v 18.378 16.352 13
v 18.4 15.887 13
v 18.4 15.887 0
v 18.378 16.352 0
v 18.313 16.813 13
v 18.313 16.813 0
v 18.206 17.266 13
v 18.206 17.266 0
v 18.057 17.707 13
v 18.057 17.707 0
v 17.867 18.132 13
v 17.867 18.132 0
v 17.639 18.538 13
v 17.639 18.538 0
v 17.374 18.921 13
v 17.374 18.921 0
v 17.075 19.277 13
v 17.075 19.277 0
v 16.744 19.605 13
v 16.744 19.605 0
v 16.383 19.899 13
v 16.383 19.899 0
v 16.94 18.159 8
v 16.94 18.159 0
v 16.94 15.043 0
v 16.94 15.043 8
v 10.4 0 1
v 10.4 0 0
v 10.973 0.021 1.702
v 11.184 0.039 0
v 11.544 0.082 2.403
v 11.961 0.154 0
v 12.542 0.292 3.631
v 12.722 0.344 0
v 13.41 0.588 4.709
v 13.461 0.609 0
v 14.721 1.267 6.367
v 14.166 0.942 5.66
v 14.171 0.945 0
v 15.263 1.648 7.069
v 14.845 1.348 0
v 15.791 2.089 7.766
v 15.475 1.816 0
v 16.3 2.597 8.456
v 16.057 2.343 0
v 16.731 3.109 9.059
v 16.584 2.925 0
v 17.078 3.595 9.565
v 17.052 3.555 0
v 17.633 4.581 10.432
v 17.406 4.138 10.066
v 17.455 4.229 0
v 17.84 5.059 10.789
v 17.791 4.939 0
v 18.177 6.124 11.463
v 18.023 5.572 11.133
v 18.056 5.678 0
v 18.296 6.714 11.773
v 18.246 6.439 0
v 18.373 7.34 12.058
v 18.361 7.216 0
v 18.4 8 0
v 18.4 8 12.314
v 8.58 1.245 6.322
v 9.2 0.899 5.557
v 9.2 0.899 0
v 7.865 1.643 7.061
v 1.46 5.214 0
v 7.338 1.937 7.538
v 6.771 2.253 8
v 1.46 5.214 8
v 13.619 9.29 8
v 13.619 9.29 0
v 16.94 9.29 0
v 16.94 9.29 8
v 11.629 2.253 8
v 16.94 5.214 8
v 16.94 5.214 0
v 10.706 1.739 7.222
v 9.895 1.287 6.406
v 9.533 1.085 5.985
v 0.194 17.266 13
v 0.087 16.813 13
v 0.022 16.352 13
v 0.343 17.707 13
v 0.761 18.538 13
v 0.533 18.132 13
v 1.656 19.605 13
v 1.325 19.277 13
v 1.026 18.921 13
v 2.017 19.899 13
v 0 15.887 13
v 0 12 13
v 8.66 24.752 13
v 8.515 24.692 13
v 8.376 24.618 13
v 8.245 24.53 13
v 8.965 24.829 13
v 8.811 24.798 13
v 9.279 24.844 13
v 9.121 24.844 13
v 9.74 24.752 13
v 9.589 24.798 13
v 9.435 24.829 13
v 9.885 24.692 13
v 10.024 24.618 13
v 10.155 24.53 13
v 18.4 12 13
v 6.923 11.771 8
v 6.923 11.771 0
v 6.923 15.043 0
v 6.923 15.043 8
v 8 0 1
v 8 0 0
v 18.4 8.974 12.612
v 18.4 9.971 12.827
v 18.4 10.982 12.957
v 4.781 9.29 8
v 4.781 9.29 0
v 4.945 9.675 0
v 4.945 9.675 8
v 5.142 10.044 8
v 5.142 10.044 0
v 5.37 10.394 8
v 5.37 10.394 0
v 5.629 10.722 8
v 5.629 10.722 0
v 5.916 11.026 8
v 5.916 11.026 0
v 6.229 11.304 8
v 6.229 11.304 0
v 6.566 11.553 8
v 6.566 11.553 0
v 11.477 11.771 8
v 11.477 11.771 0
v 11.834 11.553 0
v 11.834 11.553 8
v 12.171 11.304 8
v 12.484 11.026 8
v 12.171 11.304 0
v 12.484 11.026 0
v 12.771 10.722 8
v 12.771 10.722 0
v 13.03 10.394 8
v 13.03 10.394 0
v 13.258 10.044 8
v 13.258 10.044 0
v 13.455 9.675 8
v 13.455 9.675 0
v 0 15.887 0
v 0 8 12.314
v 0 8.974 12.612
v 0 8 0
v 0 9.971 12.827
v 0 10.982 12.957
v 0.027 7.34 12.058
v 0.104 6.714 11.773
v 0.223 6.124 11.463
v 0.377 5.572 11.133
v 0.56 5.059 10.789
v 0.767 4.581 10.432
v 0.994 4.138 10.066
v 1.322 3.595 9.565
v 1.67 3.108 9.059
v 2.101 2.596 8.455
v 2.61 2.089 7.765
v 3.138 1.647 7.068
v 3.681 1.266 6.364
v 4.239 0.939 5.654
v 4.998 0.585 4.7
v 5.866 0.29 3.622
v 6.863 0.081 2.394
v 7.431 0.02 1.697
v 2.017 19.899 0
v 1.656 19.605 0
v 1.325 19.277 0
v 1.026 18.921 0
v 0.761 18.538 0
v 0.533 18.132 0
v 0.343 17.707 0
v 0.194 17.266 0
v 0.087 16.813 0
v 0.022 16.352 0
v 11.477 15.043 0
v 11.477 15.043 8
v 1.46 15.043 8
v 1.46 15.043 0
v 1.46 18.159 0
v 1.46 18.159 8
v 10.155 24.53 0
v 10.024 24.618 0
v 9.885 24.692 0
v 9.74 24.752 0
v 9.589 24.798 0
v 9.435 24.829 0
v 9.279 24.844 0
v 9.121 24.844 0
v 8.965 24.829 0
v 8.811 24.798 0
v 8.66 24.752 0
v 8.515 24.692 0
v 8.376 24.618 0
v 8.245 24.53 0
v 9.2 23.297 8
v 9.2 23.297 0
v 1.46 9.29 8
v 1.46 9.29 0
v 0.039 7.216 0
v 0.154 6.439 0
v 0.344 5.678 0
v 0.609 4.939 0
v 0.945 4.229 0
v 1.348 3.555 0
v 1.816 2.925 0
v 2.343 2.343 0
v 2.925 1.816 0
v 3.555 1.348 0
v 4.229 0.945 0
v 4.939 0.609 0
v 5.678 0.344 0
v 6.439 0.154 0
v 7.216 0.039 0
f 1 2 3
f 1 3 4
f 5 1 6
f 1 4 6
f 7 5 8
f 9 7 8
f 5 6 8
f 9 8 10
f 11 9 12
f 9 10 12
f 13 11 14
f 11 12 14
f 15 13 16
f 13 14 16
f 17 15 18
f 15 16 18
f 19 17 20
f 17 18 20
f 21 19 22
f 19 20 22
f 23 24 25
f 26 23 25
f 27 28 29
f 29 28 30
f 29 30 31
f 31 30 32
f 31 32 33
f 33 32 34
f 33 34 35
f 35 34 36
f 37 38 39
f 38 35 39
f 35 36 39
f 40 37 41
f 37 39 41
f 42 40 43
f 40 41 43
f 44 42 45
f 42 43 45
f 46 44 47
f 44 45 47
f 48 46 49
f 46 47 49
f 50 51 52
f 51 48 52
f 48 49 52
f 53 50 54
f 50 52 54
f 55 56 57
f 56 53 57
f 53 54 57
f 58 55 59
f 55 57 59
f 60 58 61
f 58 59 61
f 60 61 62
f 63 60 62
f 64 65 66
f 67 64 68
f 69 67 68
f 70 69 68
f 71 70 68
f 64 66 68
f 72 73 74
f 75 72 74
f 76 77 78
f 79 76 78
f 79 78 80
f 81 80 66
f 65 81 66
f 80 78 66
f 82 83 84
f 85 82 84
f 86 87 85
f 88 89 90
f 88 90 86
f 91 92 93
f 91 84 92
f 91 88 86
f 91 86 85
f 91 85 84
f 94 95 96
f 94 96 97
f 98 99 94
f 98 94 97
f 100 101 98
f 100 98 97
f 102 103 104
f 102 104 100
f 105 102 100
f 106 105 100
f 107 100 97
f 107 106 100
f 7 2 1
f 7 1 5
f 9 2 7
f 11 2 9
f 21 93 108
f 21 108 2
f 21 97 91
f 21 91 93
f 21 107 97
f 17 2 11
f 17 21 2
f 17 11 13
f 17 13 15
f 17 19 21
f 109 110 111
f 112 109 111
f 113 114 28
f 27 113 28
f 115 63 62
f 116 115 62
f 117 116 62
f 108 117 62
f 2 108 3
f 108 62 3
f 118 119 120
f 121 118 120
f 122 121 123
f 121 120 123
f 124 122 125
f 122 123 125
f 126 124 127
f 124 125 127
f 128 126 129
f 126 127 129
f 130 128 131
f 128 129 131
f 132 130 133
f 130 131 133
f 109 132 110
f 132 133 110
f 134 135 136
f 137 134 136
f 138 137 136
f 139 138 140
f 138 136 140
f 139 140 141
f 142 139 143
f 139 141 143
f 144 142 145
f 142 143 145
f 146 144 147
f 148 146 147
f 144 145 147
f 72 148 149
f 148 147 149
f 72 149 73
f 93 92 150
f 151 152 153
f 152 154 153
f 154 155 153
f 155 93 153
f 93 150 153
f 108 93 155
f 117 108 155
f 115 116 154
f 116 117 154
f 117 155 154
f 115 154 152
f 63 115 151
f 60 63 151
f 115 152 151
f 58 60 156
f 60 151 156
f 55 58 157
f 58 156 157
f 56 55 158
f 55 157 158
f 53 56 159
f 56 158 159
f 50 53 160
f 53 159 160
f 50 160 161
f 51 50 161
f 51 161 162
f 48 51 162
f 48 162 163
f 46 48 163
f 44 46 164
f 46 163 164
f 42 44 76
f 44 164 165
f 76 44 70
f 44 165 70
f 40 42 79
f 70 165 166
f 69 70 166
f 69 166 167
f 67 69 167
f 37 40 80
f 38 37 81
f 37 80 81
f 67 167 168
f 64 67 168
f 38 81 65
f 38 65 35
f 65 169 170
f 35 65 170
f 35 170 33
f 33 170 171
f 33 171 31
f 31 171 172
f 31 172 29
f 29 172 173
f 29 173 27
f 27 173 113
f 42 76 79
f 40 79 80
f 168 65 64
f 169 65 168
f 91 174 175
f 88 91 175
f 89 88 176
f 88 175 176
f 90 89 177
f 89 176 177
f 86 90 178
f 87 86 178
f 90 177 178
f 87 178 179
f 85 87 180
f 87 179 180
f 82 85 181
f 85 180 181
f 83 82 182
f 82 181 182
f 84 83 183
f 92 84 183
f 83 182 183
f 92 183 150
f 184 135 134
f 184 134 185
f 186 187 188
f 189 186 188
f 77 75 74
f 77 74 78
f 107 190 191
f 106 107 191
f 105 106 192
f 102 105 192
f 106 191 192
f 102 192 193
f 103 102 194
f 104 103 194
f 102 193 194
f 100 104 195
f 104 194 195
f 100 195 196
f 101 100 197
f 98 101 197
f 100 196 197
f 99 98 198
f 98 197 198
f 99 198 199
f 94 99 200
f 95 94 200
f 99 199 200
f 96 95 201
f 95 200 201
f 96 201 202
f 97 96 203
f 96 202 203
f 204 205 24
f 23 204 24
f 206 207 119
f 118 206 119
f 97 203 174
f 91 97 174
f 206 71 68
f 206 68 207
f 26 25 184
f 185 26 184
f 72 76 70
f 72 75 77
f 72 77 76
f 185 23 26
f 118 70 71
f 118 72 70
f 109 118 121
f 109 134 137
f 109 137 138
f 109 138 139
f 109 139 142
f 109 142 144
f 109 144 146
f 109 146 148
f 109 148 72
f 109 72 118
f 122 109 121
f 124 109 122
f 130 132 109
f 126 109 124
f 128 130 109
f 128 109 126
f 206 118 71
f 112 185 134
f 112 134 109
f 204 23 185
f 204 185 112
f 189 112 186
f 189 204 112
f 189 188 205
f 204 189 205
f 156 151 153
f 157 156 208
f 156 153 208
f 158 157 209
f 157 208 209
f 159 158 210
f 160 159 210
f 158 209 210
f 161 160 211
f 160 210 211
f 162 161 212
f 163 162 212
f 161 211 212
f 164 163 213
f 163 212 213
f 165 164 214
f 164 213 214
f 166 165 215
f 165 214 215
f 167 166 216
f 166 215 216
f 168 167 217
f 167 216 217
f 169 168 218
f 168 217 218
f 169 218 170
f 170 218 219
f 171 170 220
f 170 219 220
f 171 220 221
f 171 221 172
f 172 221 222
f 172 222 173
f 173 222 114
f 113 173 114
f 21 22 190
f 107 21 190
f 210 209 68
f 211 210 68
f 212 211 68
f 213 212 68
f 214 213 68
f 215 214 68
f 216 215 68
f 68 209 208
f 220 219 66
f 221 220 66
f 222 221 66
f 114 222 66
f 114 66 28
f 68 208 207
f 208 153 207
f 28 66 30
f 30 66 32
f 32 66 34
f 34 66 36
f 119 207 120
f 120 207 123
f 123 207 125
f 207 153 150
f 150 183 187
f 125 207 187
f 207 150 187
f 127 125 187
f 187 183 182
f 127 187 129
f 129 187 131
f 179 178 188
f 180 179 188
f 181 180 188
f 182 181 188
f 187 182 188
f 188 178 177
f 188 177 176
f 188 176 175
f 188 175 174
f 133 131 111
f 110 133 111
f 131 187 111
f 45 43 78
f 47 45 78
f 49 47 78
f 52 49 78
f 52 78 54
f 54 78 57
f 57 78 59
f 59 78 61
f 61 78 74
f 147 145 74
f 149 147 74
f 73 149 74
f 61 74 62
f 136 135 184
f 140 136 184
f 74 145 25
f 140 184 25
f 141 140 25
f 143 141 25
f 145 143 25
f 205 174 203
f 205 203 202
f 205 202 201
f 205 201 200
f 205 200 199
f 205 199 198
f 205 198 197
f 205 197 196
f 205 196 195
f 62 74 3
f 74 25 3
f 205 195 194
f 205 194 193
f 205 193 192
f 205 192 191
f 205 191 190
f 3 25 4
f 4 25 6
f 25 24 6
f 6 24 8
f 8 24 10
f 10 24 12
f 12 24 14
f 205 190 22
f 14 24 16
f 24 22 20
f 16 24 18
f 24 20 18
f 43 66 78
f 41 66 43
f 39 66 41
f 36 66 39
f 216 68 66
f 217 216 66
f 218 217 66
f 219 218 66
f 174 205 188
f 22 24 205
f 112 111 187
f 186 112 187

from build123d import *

# Parameters (mm, degrees)
BOSS_EXTRUDE1_DEPTH = 13
FILLET1_R           = 12
CUT_EXTRUDE1_DEPTH  = 8
SKETCH5_R           = 4.716803238
CUT_EXTRUDE2_DEPTH  = 8
SKETCH6_W           = 4.554767644
SKETCH6_H           = 3.613594083
CUT_EXTRUDE3_DEPTH  = 8


with BuildPart() as part:
    # Sketch2 → Boss-Extrude1 (new body)
    with BuildSketch(Plane.XY):
        with BuildLine():
            Line((8, 0), (10.4, 0))
            ThreePointArc((10.4, 0), (16.056854249, 2.343145751), (18.4, 8))
            Line((18.4, 8), (18.4, 15.886901909))
            ThreePointArc((18.4, 15.886901909), (17.867444955, 18.132327386), (16.383225769, 19.899427797))
            Line((16.383225769, 19.899427797), (10.154632246, 24.530251678))
            ThreePointArc((10.154632246, 24.530251678), (9.2, 24.846243393), (8.245367754, 24.530251678))
            Line((8.245367754, 24.530251678), (2.016774231, 19.899427797))
            ThreePointArc((2.016774231, 19.899427797), (0.532555045, 18.132327386), (0, 15.886901909))
            Line((0, 15.886901909), (0, 8))
            ThreePointArc((0, 8), (2.343145751, 2.343145751), (8, 0))
        make_face()
    extrude(amount=BOSS_EXTRUDE1_DEPTH)

    # Fillet1
    # the kernel refuses this fillet: 12 mm, written as the material it takes off along each edge
    with BuildSketch(Plane(origin=(-22, 0, 13), x_dir=(0, 0, -1), z_dir=(1, 0, 0))) as fillet1_piece_1:
        with BuildLine():
            CenterArc((FILLET1_R, FILLET1_R), FILLET1_R, 180, 90)
            Line((0, FILLET1_R), (0, 0))
            Line((0, 0), (FILLET1_R, 0))
        make_face()
    extrude(amount=62.4, mode=Mode.SUBTRACT)

    # Sketch4 → Cut-Extrude1 (cut)
    with BuildSketch(Plane(origin=(0, 0, 0), x_dir=(-1, 0, 0), z_dir=(0, 0, -1))):
        Polygon((-9.2, 23.296502957), (-16.939792645, 18.15947244), (-16.939792645, 15.04300726), (-1.460207355, 15.04300726), (-1.460207355, 18.15947244), align=None)
        Polygon((-1.460207355, 9.289533082), (-16.939792645, 9.289533082), (-16.939792645, 5.214155538), (-9.2, 0.899049904), (-1.460207355, 5.214155538), align=None)
    extrude(amount=-CUT_EXTRUDE1_DEPTH, mode=Mode.SUBTRACT)

    # Sketch5 → Cut-Extrude2 (cut)
    with BuildSketch(Plane(origin=(0, 0, 0), x_dir=(-1, 0, 0), z_dir=(0, 0, -1))):
        with Locations((-9.2, 7.64)):
            Circle(SKETCH5_R)
    extrude(amount=-CUT_EXTRUDE2_DEPTH, mode=Mode.SUBTRACT)

    # Sketch6 → Cut-Extrude3 (cut)
    with BuildSketch(Plane(origin=(0, 0, 0), x_dir=(-1, 0, 0), z_dir=(0, 0, -1))):
        with Locations((-9.2, 13.577384858)):
            Rectangle(SKETCH6_W, SKETCH6_H)
    extrude(amount=-CUT_EXTRUDE3_DEPTH, mode=Mode.SUBTRACT)


solid = part.part
